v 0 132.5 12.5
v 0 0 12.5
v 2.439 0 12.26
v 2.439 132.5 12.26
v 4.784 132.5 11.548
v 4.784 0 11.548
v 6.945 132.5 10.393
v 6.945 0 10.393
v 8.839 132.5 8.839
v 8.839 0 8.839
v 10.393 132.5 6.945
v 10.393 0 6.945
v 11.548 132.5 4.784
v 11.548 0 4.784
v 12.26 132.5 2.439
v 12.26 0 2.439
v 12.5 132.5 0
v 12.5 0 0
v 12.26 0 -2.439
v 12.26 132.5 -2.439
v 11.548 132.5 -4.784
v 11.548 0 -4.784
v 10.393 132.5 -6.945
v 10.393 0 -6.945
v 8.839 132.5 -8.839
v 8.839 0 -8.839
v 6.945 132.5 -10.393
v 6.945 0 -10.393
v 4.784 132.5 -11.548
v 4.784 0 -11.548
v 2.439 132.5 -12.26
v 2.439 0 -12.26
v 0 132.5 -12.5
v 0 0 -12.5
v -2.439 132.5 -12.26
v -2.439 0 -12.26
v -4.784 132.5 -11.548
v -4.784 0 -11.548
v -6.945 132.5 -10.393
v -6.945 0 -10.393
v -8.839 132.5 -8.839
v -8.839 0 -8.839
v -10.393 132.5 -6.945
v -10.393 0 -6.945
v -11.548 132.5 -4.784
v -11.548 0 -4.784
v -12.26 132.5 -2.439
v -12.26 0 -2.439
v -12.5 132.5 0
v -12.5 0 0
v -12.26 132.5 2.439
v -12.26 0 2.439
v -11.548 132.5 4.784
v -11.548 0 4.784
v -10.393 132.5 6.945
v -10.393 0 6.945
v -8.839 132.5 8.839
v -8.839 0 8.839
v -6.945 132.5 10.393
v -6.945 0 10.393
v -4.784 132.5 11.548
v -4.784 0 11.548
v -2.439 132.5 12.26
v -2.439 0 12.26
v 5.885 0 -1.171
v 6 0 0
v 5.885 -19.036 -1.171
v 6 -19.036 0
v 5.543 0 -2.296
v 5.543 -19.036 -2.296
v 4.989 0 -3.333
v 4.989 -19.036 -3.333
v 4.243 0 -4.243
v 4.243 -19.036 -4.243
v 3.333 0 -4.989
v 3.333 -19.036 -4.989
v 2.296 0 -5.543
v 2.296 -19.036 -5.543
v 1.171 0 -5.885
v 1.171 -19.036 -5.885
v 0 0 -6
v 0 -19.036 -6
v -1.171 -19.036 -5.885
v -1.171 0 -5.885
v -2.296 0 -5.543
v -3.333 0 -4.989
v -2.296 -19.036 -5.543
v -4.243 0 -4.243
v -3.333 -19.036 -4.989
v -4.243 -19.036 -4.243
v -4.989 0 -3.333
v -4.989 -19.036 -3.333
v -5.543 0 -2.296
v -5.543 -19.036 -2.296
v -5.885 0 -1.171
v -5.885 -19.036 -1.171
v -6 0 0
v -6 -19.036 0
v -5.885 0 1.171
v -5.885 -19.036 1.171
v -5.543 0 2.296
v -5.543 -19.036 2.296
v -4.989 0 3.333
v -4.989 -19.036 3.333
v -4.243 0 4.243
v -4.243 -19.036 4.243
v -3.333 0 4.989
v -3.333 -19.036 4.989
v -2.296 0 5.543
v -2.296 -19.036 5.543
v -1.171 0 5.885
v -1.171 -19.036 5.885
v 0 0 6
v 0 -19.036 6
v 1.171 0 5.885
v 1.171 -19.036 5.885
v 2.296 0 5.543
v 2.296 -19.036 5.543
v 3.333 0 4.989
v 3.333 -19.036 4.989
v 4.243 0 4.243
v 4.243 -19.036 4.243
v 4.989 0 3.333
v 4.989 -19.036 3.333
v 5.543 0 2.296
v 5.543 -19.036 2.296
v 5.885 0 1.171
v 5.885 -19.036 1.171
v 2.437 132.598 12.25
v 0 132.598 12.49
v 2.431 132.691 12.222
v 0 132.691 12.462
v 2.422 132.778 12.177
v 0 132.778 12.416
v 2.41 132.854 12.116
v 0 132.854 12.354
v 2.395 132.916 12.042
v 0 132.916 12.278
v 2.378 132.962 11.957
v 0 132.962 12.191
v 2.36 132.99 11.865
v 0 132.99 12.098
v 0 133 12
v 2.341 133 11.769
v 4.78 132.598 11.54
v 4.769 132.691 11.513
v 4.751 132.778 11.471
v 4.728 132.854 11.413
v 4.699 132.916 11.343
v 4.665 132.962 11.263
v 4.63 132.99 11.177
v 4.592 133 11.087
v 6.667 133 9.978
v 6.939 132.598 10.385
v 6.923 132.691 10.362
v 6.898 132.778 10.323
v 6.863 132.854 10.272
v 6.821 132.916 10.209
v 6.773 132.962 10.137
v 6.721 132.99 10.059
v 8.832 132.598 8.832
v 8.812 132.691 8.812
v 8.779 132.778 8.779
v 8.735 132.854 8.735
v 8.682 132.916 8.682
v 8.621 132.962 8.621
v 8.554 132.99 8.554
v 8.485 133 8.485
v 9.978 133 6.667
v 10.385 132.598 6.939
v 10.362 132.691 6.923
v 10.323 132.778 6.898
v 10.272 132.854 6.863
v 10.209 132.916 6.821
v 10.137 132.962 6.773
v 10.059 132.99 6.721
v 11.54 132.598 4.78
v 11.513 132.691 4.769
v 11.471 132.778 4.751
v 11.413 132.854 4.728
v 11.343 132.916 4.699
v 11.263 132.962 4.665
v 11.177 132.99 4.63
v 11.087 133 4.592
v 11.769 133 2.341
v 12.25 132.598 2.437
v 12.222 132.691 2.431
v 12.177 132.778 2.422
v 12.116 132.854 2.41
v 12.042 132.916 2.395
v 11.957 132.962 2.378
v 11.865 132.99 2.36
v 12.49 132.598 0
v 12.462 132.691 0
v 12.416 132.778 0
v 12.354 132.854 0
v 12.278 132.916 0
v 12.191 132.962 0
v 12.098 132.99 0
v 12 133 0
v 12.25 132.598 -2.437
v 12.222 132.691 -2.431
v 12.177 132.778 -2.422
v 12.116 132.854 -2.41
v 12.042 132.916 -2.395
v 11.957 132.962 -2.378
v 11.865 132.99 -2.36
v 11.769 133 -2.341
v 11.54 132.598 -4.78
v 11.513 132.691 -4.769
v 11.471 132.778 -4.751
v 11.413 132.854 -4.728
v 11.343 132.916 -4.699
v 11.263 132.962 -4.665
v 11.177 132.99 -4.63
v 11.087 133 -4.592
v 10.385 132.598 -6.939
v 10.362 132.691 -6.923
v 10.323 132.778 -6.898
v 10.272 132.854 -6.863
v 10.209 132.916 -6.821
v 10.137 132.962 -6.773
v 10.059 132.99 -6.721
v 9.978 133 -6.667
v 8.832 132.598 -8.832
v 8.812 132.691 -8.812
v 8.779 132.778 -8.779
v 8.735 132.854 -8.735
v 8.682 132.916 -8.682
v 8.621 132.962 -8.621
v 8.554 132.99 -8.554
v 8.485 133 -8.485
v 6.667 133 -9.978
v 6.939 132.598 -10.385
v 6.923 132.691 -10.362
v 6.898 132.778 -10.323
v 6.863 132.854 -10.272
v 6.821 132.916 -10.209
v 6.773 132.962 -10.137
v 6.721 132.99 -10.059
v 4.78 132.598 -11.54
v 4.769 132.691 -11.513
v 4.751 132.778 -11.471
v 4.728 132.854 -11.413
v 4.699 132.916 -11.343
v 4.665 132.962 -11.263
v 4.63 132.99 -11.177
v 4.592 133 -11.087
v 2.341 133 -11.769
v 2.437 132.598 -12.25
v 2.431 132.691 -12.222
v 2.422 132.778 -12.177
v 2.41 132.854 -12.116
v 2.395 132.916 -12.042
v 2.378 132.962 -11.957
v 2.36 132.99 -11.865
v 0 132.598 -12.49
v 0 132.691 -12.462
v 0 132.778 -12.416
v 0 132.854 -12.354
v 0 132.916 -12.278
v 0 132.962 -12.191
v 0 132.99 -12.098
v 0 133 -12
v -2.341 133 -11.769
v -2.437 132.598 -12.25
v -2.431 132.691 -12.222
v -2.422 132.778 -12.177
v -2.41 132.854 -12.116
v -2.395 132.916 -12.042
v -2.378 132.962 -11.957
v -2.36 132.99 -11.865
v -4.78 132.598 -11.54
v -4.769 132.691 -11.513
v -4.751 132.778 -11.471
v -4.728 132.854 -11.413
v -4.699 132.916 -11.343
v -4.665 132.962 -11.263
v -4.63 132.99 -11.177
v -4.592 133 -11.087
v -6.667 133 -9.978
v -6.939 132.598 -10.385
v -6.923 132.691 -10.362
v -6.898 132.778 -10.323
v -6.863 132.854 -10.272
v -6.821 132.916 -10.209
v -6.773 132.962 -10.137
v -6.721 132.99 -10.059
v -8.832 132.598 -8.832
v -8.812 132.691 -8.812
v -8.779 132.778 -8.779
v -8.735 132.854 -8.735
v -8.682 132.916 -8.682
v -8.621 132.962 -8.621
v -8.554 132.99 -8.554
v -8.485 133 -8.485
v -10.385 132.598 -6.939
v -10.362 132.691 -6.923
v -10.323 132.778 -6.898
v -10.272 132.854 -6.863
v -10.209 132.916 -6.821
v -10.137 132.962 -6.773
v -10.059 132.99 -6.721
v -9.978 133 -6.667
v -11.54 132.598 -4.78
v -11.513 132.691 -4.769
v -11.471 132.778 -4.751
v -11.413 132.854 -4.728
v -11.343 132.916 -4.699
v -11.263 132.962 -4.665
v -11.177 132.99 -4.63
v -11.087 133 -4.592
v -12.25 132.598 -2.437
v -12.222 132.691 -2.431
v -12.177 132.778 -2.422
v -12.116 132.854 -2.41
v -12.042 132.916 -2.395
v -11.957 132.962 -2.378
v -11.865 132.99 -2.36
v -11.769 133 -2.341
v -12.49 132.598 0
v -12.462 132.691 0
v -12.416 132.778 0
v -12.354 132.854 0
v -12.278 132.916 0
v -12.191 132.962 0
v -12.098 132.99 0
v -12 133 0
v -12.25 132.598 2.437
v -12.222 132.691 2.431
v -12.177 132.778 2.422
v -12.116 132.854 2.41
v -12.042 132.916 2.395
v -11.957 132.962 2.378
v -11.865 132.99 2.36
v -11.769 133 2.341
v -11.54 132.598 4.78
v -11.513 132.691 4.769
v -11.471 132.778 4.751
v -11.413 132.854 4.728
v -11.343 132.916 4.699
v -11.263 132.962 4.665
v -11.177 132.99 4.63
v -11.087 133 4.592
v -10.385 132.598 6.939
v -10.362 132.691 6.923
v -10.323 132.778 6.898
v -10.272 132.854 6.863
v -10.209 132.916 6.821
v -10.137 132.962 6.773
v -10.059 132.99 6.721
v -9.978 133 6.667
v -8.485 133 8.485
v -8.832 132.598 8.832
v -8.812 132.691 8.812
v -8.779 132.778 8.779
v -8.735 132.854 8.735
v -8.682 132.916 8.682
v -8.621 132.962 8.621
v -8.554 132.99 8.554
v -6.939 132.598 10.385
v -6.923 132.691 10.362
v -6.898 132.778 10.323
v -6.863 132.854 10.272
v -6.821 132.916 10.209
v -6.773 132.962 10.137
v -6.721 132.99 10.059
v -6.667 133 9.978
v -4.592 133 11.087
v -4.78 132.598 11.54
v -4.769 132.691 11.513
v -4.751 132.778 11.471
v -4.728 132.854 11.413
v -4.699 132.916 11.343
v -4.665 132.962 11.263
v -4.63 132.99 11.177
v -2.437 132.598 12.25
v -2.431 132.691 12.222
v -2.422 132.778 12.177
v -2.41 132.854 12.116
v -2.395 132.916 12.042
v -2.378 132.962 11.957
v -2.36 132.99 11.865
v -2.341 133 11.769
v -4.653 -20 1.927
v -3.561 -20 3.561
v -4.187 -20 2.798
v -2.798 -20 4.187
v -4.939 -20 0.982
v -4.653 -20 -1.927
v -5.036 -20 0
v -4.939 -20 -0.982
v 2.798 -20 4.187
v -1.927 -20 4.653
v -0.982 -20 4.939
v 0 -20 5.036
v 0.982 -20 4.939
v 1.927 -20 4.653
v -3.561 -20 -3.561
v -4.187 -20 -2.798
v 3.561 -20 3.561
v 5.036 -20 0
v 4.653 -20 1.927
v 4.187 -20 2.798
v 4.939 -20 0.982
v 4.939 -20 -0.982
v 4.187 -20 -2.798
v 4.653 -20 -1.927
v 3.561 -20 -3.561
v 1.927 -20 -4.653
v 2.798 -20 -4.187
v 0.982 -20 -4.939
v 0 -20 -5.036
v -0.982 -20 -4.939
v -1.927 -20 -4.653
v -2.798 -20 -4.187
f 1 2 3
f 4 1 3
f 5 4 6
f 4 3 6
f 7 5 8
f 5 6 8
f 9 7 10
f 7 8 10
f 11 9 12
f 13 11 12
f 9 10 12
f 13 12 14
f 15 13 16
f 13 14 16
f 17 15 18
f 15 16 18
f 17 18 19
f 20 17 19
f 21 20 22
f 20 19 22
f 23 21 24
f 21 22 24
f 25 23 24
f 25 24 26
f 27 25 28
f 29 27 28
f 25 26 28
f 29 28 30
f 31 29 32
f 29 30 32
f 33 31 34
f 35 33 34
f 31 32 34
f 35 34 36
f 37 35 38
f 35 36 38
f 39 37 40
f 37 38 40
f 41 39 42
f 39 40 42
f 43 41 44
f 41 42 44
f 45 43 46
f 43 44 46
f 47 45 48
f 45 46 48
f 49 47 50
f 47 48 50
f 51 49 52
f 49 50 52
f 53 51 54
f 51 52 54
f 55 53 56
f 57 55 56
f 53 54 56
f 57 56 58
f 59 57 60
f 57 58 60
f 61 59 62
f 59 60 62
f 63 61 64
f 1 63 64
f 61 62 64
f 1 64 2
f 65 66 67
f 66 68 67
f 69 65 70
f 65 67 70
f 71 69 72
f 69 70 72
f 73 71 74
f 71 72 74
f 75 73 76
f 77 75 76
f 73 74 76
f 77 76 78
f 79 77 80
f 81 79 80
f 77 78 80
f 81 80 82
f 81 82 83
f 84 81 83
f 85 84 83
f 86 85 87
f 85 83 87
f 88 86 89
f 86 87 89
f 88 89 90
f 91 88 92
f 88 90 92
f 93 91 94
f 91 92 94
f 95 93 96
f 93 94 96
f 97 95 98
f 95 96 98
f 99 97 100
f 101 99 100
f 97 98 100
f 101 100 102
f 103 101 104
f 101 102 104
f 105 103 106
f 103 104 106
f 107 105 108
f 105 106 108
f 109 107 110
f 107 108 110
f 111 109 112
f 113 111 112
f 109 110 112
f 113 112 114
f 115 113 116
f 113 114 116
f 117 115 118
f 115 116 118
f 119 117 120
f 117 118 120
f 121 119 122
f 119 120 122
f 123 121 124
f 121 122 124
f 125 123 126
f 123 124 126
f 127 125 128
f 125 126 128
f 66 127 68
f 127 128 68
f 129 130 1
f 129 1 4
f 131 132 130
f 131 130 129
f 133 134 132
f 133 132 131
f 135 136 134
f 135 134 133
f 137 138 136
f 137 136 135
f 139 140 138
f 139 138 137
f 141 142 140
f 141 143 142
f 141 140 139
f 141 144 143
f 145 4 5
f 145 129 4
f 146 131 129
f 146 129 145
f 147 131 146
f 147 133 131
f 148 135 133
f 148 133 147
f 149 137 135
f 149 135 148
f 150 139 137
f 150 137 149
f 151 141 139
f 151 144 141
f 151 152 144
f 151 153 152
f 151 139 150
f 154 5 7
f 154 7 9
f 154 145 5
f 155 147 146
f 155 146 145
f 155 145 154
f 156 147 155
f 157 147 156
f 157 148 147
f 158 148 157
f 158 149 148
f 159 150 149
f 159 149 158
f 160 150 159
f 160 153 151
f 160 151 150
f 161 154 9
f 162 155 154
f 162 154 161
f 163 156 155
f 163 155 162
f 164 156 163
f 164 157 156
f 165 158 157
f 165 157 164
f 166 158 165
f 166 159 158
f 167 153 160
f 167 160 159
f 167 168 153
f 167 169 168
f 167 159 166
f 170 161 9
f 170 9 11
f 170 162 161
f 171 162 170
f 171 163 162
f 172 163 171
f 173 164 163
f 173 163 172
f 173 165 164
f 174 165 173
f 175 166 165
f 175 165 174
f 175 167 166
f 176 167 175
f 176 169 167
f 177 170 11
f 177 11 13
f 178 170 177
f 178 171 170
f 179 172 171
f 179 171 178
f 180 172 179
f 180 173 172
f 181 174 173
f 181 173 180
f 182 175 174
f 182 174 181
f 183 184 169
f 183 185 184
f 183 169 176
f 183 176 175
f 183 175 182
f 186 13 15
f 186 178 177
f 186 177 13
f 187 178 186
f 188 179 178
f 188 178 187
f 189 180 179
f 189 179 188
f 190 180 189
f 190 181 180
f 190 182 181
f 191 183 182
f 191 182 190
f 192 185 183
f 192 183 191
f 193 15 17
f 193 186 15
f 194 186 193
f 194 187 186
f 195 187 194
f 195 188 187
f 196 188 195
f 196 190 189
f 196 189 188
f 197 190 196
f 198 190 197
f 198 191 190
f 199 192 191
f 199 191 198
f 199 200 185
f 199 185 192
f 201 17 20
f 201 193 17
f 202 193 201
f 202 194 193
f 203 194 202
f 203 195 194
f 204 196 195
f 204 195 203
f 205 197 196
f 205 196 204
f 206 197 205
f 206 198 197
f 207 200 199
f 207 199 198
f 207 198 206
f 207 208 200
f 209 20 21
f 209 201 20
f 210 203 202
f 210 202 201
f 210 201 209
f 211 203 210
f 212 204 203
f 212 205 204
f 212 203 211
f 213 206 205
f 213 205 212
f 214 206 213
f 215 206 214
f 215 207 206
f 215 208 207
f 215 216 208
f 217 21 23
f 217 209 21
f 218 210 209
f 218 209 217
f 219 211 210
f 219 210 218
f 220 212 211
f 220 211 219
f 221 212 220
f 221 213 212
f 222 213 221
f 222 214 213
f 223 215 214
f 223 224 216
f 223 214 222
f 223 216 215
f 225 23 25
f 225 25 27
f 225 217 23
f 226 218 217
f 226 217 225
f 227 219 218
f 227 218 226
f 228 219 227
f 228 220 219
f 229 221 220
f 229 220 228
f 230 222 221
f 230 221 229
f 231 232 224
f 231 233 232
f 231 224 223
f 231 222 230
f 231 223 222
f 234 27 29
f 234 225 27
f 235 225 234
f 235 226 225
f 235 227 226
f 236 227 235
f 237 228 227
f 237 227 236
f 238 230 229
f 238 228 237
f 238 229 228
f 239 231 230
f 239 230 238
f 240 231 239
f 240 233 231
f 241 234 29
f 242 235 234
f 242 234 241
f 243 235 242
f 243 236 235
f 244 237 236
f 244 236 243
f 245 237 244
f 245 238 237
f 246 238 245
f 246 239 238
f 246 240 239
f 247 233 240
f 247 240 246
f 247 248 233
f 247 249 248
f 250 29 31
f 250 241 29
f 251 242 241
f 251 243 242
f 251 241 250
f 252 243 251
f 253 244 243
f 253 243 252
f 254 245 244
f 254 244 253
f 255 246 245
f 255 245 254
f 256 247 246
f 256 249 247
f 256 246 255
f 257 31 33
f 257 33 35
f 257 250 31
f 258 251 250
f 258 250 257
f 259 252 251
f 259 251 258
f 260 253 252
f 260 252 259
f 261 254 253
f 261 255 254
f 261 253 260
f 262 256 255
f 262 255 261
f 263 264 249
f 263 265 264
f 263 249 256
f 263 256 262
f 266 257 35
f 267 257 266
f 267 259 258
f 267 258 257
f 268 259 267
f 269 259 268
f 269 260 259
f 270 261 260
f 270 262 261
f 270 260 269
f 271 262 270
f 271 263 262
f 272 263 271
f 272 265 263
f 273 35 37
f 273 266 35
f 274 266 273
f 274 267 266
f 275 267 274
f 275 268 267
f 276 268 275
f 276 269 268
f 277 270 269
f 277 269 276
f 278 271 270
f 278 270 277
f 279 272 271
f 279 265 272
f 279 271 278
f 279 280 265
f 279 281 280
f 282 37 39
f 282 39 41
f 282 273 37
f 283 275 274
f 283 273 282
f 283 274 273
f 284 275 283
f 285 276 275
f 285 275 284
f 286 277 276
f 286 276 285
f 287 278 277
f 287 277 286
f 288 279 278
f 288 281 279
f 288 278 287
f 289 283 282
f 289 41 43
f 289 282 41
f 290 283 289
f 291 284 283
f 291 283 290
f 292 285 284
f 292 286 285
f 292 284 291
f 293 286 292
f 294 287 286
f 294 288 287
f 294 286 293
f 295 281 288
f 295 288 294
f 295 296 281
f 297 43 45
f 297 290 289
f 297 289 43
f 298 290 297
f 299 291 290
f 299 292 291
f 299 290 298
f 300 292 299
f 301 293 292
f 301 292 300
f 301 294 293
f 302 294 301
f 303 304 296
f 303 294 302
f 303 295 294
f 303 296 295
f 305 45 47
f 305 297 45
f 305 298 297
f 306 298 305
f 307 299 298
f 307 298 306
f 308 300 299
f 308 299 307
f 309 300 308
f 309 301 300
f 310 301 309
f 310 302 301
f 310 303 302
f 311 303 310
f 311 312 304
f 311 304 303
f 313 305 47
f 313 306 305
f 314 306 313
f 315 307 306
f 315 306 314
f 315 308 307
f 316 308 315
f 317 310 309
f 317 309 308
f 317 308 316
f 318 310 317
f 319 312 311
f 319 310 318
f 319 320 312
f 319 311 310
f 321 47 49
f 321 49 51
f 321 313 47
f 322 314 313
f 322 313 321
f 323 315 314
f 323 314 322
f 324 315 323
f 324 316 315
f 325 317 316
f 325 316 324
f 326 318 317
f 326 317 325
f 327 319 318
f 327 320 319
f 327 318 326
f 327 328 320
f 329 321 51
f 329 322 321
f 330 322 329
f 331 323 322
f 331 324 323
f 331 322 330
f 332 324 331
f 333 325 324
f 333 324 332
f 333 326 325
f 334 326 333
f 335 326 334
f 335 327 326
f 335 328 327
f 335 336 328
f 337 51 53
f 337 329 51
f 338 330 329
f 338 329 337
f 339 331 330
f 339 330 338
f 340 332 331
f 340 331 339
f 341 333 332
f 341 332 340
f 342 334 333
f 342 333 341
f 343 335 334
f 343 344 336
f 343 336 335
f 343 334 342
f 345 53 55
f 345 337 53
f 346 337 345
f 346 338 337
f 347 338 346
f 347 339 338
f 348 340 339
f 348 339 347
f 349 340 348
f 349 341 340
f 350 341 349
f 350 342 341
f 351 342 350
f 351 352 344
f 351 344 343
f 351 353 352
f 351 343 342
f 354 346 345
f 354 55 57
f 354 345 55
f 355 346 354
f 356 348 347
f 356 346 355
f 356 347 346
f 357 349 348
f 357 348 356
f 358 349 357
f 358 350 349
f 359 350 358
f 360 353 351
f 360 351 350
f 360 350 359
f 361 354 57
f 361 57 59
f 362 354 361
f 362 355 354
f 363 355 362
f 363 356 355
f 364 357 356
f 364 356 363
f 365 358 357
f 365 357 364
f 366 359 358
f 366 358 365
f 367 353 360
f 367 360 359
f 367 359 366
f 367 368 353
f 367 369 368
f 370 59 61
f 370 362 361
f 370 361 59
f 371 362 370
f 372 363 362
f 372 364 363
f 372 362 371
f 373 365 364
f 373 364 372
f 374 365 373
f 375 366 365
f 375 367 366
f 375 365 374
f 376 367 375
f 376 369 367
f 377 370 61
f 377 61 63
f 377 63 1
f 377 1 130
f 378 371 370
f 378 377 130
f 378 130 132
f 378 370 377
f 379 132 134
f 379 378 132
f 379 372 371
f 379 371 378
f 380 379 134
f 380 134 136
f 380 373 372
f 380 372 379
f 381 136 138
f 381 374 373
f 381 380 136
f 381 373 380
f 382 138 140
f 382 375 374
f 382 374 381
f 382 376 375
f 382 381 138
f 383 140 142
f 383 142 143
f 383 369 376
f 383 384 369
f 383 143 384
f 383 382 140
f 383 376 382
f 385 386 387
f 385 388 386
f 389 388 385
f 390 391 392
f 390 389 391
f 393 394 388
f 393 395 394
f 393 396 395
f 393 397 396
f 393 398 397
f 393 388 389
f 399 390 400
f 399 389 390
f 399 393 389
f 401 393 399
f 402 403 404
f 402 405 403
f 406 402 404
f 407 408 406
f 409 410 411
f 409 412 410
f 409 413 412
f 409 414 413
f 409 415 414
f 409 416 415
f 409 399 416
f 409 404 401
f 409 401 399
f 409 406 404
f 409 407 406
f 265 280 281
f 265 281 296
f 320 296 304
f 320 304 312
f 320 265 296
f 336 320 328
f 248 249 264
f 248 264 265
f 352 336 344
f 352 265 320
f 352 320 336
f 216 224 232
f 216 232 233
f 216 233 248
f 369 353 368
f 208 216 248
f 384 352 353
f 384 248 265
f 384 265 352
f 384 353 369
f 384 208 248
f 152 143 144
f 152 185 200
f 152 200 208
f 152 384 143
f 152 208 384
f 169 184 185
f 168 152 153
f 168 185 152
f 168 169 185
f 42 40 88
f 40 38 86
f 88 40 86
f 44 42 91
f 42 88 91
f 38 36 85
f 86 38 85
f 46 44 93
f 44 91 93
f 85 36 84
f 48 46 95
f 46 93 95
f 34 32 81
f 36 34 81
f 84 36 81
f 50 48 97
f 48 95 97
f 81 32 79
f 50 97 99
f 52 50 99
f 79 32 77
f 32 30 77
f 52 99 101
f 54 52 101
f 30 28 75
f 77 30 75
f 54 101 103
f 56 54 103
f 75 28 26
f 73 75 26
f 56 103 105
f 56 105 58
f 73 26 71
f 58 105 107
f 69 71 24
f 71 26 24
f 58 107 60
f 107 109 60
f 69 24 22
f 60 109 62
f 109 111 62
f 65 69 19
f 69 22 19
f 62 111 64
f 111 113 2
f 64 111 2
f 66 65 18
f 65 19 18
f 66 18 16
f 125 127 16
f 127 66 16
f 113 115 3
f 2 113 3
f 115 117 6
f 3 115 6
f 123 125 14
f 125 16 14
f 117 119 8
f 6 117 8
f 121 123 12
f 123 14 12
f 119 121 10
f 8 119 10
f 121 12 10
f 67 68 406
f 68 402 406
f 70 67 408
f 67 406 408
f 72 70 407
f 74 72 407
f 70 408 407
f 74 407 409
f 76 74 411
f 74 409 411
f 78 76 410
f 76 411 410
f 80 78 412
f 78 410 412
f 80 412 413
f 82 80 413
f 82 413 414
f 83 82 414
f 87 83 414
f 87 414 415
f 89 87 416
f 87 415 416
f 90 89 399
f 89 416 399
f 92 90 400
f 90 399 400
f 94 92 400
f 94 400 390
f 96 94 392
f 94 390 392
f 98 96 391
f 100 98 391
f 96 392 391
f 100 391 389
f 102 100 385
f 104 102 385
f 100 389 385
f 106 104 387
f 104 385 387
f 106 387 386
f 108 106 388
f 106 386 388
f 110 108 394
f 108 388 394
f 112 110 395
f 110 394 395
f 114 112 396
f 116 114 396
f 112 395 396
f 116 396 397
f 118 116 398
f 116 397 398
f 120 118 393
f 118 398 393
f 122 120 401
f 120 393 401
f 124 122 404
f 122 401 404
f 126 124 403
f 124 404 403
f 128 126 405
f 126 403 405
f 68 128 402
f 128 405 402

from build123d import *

# Parameters (mm, degrees)
SKETCH1_R           = 12.5
BOSS_EXTRUDE1_DEPTH = 133
SKETCH2_R           = 10
BOSS_EXTRUDE2_DEPTH = 20
FILLET1_R           = 0.5


# Read off the part's stored shape, not the designer's step: M12 Machine Threads Stud1
with BuildPart() as part:
    # Sketch1 → Boss-Extrude1 (new body)
    with BuildSketch(Plane(origin=(0, 0, 0), x_dir=(1, 0, 0), z_dir=(0, 1, 0))):
        with Locations(Location((0, 0, 0), (0, 0, 270))):
            Circle(SKETCH1_R)
    extrude(amount=BOSS_EXTRUDE1_DEPTH)

    # Sketch2 → Boss-Extrude2 (add)
    with BuildSketch(Plane.XZ):
        with Locations(Location((0, 0, 0), (0, 0, 270))):
            Circle(SKETCH2_R)
    extrude(amount=BOSS_EXTRUDE2_DEPTH)

    # M12 Machine Threads Stud1 outline → M12 Machine Threads Stud1 (revolve, cut)
    with BuildSketch(Plane.XY):
        Polygon((10, 0), (6, 0), (6, -19.036), (5.036, -20), (10, -20), align=None)
    revolve(axis=Axis((0, 0, 0), (0, 1, 0)), mode=Mode.SUBTRACT)

    # Fillet1
    fillet1_edges = [part.edges().sort_by_distance(p)[0] for p in [
        (0, 133, -12.5),
    ]]
    fillet(fillet1_edges, radius=FILLET1_R)


solid = part.part
